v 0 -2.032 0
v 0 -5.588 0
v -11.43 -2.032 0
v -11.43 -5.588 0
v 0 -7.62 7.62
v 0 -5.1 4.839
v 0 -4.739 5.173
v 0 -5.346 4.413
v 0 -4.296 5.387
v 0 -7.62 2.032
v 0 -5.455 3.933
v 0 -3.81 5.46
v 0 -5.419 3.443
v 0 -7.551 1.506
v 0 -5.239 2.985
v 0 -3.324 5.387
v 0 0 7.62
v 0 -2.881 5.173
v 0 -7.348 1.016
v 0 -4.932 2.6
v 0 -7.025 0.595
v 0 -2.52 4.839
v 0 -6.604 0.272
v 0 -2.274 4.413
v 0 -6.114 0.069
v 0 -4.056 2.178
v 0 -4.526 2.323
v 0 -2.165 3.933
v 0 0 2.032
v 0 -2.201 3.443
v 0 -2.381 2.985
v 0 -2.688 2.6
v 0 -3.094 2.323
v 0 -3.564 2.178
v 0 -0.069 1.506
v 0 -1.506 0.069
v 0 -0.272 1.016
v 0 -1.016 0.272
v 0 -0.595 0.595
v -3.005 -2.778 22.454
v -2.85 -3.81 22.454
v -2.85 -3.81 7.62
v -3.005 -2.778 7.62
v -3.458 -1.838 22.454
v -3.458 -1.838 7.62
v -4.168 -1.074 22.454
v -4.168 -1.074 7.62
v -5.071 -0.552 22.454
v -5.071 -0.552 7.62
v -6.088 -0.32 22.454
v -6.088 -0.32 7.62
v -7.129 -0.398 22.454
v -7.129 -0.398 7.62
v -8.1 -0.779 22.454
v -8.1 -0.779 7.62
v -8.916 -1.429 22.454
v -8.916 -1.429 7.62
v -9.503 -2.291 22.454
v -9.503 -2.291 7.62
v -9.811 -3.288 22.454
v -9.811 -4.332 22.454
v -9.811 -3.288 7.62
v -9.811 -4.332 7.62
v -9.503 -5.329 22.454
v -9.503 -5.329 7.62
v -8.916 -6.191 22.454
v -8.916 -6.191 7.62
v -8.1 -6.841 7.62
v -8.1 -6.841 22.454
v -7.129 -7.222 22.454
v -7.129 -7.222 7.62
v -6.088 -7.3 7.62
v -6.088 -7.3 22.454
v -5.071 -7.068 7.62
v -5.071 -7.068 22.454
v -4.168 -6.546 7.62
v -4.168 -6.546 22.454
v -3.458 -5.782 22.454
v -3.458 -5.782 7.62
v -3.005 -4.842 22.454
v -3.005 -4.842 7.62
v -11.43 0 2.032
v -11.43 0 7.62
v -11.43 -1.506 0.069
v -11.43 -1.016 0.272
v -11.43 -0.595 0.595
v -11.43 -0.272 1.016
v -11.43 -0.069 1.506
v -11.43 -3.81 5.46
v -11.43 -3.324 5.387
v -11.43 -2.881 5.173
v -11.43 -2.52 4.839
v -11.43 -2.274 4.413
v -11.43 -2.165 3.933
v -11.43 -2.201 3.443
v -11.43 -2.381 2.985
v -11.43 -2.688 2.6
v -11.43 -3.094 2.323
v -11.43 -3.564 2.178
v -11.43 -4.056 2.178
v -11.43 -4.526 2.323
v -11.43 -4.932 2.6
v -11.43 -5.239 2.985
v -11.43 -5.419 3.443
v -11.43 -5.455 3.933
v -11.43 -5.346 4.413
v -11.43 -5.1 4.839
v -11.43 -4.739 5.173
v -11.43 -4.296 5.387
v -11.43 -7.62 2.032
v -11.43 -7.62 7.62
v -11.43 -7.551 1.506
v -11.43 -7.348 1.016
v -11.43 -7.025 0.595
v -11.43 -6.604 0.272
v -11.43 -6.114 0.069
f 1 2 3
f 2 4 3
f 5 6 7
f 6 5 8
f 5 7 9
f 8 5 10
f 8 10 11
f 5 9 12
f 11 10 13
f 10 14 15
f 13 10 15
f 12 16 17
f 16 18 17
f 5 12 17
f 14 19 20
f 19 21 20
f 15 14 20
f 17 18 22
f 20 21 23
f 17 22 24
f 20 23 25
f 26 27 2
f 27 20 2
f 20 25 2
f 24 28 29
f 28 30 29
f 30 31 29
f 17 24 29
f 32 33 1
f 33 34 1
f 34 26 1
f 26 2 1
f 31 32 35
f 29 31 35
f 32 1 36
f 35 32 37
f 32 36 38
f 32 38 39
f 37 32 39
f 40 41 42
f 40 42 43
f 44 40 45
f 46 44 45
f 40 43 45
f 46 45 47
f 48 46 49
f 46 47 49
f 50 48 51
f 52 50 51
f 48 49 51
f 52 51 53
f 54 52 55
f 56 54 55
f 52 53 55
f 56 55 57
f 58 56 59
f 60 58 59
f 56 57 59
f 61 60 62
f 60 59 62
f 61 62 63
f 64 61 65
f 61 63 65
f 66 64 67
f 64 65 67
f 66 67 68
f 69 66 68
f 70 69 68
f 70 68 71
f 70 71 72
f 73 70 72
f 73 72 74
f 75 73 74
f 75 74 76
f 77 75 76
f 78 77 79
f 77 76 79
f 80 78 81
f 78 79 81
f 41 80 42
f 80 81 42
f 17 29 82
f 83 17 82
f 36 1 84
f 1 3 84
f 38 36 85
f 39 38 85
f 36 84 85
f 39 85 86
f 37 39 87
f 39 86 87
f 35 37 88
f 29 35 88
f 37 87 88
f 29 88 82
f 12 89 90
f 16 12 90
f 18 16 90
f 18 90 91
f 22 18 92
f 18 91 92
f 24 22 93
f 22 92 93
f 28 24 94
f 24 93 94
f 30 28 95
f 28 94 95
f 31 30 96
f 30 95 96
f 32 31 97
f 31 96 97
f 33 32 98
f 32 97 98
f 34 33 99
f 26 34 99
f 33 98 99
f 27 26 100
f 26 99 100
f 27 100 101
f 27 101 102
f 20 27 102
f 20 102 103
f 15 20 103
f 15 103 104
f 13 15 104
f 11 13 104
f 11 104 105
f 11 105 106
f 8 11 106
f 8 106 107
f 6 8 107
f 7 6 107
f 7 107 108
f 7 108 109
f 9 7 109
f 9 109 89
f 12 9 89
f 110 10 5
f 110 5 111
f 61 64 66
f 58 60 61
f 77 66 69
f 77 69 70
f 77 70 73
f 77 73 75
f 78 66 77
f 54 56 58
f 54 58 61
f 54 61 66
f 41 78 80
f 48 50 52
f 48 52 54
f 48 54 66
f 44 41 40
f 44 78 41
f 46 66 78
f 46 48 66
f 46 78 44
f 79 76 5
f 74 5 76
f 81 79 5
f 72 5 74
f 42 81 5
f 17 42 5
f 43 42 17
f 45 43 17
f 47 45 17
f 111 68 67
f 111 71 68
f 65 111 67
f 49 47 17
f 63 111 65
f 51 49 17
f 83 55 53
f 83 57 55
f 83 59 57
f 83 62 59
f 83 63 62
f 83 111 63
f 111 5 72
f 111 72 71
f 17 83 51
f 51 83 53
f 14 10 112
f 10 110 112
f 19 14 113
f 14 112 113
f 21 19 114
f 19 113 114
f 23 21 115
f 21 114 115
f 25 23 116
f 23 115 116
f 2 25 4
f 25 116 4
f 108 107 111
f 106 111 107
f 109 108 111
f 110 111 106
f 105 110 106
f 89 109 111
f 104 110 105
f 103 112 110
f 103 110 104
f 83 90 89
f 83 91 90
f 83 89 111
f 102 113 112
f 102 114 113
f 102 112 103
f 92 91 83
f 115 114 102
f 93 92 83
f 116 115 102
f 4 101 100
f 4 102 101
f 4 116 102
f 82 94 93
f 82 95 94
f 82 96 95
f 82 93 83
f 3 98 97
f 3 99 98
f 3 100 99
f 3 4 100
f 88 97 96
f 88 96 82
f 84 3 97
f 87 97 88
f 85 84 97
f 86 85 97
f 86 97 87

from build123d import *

# Parameters (mm, degrees)
SKETCH1_W                   = 7.62
SKETCH1_H                   = 11.43
BOSS_EXTRUDE1_DEPTH         = 7.62
SKETCH2_R                   = 3.499999985
BOSS_EXTRUDE2_DEPTH         = 14.8336
TAP_DRILL_FOR_M4X0_7_TAP1_D = 3.3
FILLET1_R                   = 2.032


with BuildPart() as part:
    # Sketch1 → Boss-Extrude1 (new body)
    with BuildSketch(Plane(origin=(0, 0, 0), x_dir=(0, 1, 0), z_dir=(0, 0, 1))):
        with Locations((-3.81, 5.715)):
            Rectangle(SKETCH1_W, SKETCH1_H)
    extrude(amount=BOSS_EXTRUDE1_DEPTH)

    # Sketch2 → Boss-Extrude2 (add)
    with BuildSketch(Plane.XY.offset(7.62)):
        with Locations((-6.35, -3.81)):
            Circle(SKETCH2_R)
    extrude(amount=BOSS_EXTRUDE2_DEPTH)

    # Tap Drill for M4x0.7 Tap1 (through all)
    with Locations(Plane(origin=(0, 0, 0), x_dir=(0, 0, -1), z_dir=(1, 0, 0))):
        with Locations((-3.81, -3.81)):
            Hole(TAP_DRILL_FOR_M4X0_7_TAP1_D / 2)

    # Fillet1
    fillet1_edges = [part.edges().sort_by_distance(p)[0] for p in [
        (-5.715, -7.62, 0),
        (-5.715, 0, 0),
    ]]
    fillet(fillet1_edges, radius=FILLET1_R)


solid = part.part
